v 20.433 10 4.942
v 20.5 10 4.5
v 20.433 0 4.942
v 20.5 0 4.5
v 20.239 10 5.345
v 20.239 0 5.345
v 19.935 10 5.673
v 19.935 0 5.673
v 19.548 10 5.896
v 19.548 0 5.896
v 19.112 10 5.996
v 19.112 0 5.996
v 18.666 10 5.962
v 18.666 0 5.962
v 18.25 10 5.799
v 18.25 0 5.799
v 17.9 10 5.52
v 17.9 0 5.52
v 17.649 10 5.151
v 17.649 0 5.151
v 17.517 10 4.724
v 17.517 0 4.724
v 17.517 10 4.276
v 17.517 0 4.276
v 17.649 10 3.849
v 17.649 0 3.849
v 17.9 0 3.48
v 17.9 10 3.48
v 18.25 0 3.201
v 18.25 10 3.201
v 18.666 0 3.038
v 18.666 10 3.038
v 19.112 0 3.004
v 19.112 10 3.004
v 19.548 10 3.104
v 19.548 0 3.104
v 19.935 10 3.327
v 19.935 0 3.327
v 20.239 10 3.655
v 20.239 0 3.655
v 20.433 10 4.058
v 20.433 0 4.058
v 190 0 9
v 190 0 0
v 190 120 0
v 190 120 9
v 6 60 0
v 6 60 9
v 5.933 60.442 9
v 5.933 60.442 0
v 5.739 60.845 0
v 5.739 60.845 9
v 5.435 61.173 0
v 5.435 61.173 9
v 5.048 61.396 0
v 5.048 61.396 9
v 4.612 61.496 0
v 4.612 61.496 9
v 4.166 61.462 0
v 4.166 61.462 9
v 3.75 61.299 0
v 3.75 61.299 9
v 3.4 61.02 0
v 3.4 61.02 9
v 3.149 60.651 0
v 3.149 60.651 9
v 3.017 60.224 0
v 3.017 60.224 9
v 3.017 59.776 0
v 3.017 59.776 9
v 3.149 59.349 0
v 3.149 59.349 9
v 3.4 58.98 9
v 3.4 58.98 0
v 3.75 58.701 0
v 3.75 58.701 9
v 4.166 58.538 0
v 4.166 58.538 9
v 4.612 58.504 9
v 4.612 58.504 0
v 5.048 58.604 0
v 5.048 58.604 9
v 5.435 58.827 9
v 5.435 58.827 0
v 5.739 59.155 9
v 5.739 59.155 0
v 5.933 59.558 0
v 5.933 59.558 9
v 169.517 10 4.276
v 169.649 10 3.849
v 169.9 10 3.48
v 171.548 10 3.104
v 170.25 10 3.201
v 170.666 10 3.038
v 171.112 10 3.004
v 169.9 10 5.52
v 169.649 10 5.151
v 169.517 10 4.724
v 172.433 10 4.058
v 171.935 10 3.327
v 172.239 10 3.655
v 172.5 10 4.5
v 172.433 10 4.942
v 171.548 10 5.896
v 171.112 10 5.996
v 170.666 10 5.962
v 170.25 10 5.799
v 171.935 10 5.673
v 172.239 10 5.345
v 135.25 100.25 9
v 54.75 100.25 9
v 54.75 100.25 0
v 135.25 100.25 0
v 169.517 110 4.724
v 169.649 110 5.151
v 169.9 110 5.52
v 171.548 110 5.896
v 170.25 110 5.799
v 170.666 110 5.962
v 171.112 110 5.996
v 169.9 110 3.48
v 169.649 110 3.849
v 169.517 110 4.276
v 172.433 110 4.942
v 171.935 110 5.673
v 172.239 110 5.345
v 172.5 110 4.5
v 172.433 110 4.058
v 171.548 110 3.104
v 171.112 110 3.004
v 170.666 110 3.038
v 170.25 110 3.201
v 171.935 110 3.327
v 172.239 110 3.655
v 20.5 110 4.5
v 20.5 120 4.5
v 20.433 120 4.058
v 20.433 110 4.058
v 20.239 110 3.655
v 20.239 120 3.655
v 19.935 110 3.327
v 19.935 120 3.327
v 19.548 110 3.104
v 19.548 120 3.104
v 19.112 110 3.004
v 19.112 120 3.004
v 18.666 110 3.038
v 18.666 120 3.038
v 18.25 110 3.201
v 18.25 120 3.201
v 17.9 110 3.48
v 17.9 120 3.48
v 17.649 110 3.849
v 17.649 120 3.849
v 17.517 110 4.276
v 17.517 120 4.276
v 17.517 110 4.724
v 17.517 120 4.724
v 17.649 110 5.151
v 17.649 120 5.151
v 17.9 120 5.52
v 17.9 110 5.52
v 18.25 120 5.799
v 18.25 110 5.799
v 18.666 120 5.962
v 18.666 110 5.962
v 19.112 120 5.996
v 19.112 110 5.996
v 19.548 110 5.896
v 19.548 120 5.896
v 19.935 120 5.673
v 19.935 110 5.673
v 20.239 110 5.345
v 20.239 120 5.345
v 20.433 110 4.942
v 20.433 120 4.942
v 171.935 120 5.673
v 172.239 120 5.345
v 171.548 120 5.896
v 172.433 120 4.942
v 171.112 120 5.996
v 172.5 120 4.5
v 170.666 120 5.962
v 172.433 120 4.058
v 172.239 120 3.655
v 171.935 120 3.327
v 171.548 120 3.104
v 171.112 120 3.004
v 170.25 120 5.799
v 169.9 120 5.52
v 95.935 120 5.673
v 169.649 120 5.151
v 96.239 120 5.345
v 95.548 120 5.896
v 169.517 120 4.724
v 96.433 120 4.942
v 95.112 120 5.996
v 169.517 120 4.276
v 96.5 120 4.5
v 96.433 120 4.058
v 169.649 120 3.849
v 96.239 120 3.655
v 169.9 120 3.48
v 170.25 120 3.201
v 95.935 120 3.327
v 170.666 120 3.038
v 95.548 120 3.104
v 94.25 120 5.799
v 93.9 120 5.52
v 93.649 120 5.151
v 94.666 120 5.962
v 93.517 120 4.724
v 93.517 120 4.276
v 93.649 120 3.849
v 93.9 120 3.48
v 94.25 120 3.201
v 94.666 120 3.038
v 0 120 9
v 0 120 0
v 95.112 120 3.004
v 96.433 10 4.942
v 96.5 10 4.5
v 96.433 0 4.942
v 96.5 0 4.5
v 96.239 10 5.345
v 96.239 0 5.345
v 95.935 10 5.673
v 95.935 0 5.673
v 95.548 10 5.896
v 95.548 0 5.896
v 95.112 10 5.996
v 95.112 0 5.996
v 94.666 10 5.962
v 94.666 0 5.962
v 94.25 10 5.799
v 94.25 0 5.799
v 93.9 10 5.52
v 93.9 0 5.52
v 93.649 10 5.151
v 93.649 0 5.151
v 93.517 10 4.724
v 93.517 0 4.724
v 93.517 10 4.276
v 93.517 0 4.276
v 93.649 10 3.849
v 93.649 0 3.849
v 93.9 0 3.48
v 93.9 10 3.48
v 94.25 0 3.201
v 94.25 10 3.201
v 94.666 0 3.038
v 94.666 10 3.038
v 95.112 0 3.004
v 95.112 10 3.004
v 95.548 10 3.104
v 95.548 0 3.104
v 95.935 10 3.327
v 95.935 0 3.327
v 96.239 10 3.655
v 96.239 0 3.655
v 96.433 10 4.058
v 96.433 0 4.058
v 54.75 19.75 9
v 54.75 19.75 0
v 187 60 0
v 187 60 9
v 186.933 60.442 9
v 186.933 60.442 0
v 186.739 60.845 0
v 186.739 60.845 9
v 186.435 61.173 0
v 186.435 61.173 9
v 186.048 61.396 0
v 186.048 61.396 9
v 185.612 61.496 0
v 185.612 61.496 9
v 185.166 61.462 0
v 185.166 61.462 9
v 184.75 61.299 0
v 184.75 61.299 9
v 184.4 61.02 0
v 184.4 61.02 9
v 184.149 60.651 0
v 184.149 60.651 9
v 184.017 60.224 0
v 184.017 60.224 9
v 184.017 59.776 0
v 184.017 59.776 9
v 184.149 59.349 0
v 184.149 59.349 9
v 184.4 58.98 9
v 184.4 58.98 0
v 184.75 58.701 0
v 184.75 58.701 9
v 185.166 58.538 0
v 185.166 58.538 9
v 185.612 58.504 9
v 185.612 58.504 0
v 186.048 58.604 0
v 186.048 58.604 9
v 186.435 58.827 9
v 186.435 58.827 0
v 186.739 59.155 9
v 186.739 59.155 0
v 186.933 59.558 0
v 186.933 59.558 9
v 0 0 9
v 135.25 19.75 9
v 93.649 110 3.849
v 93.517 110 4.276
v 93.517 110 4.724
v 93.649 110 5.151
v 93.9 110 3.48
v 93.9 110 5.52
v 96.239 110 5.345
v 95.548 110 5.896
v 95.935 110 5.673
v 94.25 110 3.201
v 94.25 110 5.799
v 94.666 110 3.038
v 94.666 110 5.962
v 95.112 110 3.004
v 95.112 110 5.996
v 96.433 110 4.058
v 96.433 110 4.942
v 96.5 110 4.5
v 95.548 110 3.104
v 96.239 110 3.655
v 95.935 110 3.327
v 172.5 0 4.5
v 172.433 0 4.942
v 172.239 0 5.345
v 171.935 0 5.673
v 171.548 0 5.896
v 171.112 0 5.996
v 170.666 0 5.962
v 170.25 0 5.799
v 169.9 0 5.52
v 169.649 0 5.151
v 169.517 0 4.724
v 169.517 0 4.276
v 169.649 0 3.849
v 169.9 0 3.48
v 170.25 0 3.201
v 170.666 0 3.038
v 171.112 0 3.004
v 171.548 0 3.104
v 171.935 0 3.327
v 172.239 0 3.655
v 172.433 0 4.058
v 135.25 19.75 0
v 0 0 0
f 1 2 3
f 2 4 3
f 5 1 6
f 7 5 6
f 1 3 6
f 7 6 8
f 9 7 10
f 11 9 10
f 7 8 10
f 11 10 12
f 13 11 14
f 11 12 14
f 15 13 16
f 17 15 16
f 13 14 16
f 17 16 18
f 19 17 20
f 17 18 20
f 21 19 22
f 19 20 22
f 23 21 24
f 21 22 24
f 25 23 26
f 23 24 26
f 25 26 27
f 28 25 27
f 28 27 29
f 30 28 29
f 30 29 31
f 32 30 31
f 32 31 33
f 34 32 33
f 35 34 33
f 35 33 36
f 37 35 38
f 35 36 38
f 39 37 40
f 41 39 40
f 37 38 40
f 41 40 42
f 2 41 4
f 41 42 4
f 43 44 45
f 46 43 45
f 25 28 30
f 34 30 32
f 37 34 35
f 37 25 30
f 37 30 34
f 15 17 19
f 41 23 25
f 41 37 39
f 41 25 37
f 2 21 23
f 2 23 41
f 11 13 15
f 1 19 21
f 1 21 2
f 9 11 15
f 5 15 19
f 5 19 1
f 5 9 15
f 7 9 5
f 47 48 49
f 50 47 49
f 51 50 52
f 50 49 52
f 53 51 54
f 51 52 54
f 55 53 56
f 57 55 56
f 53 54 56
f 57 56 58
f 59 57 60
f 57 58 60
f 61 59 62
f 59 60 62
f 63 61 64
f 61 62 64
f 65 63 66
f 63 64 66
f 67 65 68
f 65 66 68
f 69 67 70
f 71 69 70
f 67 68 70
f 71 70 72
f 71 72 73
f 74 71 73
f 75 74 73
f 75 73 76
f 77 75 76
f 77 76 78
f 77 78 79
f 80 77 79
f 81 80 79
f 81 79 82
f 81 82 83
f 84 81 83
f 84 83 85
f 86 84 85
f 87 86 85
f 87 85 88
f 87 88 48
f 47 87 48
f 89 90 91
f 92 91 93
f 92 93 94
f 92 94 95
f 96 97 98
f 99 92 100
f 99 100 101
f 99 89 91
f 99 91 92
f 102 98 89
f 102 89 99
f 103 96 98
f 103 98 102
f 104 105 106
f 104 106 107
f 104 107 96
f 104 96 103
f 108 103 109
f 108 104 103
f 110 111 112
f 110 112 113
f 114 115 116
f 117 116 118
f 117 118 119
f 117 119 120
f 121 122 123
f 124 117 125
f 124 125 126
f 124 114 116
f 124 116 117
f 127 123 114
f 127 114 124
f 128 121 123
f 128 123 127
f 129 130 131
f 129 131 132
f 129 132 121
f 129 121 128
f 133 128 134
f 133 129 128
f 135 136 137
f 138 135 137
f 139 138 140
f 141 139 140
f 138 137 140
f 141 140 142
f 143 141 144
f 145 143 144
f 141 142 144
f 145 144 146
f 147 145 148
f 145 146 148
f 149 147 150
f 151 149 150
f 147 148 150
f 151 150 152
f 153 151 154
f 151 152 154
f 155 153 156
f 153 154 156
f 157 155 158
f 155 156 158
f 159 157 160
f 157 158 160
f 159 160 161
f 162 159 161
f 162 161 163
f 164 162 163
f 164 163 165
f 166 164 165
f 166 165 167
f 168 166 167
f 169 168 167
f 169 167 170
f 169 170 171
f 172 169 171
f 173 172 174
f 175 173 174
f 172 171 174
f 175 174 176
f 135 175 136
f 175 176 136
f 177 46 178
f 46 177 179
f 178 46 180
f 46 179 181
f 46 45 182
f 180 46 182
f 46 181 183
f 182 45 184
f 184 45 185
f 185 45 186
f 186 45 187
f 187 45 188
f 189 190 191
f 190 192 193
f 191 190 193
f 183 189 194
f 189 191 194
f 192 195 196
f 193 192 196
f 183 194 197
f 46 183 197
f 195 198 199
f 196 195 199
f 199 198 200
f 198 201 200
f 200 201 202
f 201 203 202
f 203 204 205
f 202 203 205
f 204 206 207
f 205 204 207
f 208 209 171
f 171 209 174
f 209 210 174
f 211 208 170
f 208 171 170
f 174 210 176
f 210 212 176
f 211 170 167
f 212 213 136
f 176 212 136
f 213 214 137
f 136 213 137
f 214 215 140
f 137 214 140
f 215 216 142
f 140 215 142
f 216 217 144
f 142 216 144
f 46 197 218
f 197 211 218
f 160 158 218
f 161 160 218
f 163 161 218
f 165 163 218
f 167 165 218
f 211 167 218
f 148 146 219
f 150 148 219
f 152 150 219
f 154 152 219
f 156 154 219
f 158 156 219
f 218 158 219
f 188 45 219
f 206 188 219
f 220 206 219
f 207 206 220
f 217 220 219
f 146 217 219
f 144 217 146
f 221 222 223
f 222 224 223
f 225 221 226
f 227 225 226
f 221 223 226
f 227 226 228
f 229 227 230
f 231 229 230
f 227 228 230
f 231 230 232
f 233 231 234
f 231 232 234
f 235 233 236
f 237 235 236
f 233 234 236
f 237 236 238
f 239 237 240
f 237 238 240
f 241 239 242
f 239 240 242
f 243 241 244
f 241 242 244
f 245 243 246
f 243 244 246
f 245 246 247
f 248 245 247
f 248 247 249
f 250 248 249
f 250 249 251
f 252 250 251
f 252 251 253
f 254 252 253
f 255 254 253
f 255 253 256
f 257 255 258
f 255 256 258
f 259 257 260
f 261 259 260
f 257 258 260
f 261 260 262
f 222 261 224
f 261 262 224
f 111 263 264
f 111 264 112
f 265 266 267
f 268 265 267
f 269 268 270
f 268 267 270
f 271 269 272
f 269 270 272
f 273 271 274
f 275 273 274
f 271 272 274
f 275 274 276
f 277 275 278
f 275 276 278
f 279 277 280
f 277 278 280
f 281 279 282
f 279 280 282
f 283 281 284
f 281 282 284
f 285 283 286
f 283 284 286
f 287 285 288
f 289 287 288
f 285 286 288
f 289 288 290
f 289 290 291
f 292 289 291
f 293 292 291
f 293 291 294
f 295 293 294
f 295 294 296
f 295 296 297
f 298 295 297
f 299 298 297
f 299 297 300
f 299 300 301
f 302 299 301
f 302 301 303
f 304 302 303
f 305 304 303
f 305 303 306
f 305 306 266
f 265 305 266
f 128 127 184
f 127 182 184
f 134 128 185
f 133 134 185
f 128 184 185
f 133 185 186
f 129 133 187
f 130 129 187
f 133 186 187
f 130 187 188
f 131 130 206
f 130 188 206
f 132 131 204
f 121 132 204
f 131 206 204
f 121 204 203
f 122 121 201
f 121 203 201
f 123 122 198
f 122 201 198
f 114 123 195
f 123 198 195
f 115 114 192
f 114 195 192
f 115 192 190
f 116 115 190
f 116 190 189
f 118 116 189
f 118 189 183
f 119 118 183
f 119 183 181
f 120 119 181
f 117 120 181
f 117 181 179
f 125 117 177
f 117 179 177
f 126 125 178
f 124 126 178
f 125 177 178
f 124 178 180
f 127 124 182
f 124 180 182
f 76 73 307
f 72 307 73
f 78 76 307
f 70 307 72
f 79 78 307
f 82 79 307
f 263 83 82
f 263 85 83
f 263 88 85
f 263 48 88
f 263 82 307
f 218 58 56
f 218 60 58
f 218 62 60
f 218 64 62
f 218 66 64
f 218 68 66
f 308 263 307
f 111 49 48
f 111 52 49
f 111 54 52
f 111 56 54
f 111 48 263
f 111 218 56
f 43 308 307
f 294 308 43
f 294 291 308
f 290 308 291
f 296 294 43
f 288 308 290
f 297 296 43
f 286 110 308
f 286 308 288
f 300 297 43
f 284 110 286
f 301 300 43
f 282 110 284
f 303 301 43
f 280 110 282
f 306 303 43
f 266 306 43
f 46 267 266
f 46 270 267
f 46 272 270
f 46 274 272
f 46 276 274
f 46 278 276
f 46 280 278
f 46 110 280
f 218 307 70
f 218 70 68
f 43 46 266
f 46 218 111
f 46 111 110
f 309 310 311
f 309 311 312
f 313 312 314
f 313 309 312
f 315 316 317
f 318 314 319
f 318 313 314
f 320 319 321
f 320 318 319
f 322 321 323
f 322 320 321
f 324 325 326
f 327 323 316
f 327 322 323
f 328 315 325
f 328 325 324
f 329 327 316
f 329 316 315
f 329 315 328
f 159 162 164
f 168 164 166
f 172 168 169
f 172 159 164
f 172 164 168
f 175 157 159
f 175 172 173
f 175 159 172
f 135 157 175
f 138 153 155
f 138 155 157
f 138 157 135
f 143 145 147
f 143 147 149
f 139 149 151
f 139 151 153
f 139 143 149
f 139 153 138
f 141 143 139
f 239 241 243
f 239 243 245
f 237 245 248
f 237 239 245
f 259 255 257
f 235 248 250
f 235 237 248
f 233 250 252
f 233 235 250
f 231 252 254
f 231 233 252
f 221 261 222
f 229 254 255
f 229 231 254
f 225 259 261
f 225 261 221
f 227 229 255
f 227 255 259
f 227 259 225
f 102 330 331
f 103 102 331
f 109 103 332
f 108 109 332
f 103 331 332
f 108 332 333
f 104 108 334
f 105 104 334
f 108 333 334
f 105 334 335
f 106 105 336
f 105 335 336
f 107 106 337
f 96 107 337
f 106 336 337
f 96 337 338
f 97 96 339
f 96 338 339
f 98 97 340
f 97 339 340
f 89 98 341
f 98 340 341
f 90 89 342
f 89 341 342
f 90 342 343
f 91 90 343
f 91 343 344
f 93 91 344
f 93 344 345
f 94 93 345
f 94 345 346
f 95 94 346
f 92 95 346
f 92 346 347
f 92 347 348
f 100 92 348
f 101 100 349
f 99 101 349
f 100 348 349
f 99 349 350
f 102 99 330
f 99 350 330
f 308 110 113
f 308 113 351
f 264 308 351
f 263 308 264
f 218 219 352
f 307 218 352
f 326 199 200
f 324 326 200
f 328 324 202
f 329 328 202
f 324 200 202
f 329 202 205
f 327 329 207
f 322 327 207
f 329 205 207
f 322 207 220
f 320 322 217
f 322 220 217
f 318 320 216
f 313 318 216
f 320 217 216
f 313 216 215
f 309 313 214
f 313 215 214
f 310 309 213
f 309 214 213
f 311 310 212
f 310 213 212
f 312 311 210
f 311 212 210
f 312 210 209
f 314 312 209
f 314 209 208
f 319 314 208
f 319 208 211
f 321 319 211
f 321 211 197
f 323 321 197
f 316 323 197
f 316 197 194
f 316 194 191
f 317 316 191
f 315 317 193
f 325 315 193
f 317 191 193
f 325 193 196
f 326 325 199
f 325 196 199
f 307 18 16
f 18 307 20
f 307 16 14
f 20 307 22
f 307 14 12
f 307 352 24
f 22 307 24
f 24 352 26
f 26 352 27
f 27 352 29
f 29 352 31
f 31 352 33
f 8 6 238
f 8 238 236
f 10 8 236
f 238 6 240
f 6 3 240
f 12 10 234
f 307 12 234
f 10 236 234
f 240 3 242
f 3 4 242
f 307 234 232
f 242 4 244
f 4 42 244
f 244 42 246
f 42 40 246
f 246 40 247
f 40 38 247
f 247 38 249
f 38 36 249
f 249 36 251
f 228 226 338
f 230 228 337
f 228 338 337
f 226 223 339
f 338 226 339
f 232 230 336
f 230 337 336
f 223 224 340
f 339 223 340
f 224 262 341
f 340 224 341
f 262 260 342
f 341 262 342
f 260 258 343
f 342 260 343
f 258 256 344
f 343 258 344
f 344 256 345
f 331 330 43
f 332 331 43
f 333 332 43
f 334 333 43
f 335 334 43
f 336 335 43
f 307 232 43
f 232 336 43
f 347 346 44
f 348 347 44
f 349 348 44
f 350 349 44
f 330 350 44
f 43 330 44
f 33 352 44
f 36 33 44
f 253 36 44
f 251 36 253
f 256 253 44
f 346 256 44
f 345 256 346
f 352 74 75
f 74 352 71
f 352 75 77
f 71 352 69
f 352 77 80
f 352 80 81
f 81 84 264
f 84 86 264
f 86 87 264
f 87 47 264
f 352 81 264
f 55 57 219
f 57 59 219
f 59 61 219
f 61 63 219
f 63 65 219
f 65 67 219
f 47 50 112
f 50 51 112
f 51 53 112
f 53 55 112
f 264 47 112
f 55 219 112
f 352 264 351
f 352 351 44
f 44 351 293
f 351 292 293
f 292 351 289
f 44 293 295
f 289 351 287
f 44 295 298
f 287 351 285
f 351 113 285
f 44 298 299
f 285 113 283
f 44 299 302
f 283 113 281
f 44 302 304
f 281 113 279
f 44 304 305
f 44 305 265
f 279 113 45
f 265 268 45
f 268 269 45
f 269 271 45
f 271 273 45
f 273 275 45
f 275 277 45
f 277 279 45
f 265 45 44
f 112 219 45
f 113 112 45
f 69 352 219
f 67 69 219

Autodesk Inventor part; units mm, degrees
ref_plane "YZ Plane" through (0, 0, 0) normal (1, 0, 0) x (0, 1, 0)
ref_plane "XZ Plane" through (0, 0, 0) normal (0, 1, 0) x (-1, 0, 0)
ref_plane "XY Plane" through (0, 0, 0) normal (0, 0, 1) x (1, 0, 0)
sketch "Sketch1" plane through (0, 0, 0) normal (0, 0, 1) x (1, 0, 0)
  line L0 (0, 0) -> (190, 0)
  line L1 (190, 0) -> (190, 120)
  line L2 (190, 120) -> (0, 120)
  line L3 (0, 120) -> (0, 0)
  dimension "d0" = 190
  dimension "d1" = 120
extrude "Extrusion1" add sketch "Sketch1" along normal blind 9
sketch "Sketch2" plane through (0, 0, 9) normal (0, 0, 1) x (1, 0, 0)
  line L0 (190, 0) -> (190, 120) projected
  line L1 (190, 120) -> (0, 120) projected
  line L2 (0, 120) -> (0, 0) projected
  line L3 (0, 0) -> (190, 0) projected
  line L4 (135.25, 19.75) -> (54.75, 19.75)
  line L5 (54.75, 19.75) -> (54.75, 100.25)
  line L6 (54.75, 100.25) -> (135.25, 100.25)
  line L7 (135.25, 100.25) -> (135.25, 19.75)
  line L8 (135.25, 19.75) -> (54.75, 100.25) construction
  line L9 (54.75, 19.75) -> (135.25, 100.25) construction
  point P0 (95, 60)
  dimension "d4" = 80.5
  dimension "d5" = 80.5
extrude "Extrusion2" cut sketch "Sketch2" against normal blind 10 contours L4 L5 L6 L7
sketch "Sketch3" plane through (0, 120, 0) normal (0, 1, 0) x (1, 0, 0)
  line L0 (190, 0) -> (0, 0) projected
  line L1 (0, 0) -> (0, -9) projected
  line L2 (190, -9) -> (0, -9) projected
  line L3 (190, 0) -> (190, -9) projected
  circle A0 centre (19, -4.5) radius 1.5
  circle A1 centre (95, -4.5) radius 1.5
  circle A2 centre (171, -4.5) radius 1.5
  point P0 (0, 0)
  dimension "d8" = 3
  dimension "d9" = 3
  dimension "d10" = 3
extrude "Extrusion3" cut sketch "Sketch3" against normal blind 10 contours A0 | A1 | A2
sketch "Sketch4" plane through (0, 0, 0) normal (0, -1, 0) x (1, 0, 0)
  circle A0 centre (19, 4.5) radius 1.5 projected
  circle A1 centre (95, 4.5) radius 1.5 projected
  circle A2 centre (171, 4.5) radius 1.5 projected
  point P0 (0, 0)
extrude "Extrusion4" cut sketch "Sketch4" against normal blind 10
sketch "Sketch5" plane through (0, 0, 9) normal (0, 0, 1) x (1, 0, 0)
  line L0 (190, 120) -> (0, 120) projected
  line L1 (0, 0) -> (190, 0) projected
  line L2 (0, 120) -> (9, 120)
  line L3 (9, 120) -> (9, 0)
  line L4 (9, 0) -> (0, 0)
  line L5 (0, 0) -> (0, 120)
  line L6 (190, 120) -> (181, 120)
  line L7 (181, 120) -> (181, 0)
  line L8 (181, 0) -> (190, 0)
  line L9 (190, 0) -> (190, 120)
  circle A0 centre (4.5, 60) radius 1.5
  circle A1 centre (185.5, 60) radius 1.5
  dimension "d15" = 9
  dimension "d16" = 9
  dimension "d17" = 3
  dimension "d18" = 3
extrude "Extrusion5" cut sketch "Sketch5" against normal blind 10 contours A0 | A1
properties part number "Lateral1-2_3DPrint"
